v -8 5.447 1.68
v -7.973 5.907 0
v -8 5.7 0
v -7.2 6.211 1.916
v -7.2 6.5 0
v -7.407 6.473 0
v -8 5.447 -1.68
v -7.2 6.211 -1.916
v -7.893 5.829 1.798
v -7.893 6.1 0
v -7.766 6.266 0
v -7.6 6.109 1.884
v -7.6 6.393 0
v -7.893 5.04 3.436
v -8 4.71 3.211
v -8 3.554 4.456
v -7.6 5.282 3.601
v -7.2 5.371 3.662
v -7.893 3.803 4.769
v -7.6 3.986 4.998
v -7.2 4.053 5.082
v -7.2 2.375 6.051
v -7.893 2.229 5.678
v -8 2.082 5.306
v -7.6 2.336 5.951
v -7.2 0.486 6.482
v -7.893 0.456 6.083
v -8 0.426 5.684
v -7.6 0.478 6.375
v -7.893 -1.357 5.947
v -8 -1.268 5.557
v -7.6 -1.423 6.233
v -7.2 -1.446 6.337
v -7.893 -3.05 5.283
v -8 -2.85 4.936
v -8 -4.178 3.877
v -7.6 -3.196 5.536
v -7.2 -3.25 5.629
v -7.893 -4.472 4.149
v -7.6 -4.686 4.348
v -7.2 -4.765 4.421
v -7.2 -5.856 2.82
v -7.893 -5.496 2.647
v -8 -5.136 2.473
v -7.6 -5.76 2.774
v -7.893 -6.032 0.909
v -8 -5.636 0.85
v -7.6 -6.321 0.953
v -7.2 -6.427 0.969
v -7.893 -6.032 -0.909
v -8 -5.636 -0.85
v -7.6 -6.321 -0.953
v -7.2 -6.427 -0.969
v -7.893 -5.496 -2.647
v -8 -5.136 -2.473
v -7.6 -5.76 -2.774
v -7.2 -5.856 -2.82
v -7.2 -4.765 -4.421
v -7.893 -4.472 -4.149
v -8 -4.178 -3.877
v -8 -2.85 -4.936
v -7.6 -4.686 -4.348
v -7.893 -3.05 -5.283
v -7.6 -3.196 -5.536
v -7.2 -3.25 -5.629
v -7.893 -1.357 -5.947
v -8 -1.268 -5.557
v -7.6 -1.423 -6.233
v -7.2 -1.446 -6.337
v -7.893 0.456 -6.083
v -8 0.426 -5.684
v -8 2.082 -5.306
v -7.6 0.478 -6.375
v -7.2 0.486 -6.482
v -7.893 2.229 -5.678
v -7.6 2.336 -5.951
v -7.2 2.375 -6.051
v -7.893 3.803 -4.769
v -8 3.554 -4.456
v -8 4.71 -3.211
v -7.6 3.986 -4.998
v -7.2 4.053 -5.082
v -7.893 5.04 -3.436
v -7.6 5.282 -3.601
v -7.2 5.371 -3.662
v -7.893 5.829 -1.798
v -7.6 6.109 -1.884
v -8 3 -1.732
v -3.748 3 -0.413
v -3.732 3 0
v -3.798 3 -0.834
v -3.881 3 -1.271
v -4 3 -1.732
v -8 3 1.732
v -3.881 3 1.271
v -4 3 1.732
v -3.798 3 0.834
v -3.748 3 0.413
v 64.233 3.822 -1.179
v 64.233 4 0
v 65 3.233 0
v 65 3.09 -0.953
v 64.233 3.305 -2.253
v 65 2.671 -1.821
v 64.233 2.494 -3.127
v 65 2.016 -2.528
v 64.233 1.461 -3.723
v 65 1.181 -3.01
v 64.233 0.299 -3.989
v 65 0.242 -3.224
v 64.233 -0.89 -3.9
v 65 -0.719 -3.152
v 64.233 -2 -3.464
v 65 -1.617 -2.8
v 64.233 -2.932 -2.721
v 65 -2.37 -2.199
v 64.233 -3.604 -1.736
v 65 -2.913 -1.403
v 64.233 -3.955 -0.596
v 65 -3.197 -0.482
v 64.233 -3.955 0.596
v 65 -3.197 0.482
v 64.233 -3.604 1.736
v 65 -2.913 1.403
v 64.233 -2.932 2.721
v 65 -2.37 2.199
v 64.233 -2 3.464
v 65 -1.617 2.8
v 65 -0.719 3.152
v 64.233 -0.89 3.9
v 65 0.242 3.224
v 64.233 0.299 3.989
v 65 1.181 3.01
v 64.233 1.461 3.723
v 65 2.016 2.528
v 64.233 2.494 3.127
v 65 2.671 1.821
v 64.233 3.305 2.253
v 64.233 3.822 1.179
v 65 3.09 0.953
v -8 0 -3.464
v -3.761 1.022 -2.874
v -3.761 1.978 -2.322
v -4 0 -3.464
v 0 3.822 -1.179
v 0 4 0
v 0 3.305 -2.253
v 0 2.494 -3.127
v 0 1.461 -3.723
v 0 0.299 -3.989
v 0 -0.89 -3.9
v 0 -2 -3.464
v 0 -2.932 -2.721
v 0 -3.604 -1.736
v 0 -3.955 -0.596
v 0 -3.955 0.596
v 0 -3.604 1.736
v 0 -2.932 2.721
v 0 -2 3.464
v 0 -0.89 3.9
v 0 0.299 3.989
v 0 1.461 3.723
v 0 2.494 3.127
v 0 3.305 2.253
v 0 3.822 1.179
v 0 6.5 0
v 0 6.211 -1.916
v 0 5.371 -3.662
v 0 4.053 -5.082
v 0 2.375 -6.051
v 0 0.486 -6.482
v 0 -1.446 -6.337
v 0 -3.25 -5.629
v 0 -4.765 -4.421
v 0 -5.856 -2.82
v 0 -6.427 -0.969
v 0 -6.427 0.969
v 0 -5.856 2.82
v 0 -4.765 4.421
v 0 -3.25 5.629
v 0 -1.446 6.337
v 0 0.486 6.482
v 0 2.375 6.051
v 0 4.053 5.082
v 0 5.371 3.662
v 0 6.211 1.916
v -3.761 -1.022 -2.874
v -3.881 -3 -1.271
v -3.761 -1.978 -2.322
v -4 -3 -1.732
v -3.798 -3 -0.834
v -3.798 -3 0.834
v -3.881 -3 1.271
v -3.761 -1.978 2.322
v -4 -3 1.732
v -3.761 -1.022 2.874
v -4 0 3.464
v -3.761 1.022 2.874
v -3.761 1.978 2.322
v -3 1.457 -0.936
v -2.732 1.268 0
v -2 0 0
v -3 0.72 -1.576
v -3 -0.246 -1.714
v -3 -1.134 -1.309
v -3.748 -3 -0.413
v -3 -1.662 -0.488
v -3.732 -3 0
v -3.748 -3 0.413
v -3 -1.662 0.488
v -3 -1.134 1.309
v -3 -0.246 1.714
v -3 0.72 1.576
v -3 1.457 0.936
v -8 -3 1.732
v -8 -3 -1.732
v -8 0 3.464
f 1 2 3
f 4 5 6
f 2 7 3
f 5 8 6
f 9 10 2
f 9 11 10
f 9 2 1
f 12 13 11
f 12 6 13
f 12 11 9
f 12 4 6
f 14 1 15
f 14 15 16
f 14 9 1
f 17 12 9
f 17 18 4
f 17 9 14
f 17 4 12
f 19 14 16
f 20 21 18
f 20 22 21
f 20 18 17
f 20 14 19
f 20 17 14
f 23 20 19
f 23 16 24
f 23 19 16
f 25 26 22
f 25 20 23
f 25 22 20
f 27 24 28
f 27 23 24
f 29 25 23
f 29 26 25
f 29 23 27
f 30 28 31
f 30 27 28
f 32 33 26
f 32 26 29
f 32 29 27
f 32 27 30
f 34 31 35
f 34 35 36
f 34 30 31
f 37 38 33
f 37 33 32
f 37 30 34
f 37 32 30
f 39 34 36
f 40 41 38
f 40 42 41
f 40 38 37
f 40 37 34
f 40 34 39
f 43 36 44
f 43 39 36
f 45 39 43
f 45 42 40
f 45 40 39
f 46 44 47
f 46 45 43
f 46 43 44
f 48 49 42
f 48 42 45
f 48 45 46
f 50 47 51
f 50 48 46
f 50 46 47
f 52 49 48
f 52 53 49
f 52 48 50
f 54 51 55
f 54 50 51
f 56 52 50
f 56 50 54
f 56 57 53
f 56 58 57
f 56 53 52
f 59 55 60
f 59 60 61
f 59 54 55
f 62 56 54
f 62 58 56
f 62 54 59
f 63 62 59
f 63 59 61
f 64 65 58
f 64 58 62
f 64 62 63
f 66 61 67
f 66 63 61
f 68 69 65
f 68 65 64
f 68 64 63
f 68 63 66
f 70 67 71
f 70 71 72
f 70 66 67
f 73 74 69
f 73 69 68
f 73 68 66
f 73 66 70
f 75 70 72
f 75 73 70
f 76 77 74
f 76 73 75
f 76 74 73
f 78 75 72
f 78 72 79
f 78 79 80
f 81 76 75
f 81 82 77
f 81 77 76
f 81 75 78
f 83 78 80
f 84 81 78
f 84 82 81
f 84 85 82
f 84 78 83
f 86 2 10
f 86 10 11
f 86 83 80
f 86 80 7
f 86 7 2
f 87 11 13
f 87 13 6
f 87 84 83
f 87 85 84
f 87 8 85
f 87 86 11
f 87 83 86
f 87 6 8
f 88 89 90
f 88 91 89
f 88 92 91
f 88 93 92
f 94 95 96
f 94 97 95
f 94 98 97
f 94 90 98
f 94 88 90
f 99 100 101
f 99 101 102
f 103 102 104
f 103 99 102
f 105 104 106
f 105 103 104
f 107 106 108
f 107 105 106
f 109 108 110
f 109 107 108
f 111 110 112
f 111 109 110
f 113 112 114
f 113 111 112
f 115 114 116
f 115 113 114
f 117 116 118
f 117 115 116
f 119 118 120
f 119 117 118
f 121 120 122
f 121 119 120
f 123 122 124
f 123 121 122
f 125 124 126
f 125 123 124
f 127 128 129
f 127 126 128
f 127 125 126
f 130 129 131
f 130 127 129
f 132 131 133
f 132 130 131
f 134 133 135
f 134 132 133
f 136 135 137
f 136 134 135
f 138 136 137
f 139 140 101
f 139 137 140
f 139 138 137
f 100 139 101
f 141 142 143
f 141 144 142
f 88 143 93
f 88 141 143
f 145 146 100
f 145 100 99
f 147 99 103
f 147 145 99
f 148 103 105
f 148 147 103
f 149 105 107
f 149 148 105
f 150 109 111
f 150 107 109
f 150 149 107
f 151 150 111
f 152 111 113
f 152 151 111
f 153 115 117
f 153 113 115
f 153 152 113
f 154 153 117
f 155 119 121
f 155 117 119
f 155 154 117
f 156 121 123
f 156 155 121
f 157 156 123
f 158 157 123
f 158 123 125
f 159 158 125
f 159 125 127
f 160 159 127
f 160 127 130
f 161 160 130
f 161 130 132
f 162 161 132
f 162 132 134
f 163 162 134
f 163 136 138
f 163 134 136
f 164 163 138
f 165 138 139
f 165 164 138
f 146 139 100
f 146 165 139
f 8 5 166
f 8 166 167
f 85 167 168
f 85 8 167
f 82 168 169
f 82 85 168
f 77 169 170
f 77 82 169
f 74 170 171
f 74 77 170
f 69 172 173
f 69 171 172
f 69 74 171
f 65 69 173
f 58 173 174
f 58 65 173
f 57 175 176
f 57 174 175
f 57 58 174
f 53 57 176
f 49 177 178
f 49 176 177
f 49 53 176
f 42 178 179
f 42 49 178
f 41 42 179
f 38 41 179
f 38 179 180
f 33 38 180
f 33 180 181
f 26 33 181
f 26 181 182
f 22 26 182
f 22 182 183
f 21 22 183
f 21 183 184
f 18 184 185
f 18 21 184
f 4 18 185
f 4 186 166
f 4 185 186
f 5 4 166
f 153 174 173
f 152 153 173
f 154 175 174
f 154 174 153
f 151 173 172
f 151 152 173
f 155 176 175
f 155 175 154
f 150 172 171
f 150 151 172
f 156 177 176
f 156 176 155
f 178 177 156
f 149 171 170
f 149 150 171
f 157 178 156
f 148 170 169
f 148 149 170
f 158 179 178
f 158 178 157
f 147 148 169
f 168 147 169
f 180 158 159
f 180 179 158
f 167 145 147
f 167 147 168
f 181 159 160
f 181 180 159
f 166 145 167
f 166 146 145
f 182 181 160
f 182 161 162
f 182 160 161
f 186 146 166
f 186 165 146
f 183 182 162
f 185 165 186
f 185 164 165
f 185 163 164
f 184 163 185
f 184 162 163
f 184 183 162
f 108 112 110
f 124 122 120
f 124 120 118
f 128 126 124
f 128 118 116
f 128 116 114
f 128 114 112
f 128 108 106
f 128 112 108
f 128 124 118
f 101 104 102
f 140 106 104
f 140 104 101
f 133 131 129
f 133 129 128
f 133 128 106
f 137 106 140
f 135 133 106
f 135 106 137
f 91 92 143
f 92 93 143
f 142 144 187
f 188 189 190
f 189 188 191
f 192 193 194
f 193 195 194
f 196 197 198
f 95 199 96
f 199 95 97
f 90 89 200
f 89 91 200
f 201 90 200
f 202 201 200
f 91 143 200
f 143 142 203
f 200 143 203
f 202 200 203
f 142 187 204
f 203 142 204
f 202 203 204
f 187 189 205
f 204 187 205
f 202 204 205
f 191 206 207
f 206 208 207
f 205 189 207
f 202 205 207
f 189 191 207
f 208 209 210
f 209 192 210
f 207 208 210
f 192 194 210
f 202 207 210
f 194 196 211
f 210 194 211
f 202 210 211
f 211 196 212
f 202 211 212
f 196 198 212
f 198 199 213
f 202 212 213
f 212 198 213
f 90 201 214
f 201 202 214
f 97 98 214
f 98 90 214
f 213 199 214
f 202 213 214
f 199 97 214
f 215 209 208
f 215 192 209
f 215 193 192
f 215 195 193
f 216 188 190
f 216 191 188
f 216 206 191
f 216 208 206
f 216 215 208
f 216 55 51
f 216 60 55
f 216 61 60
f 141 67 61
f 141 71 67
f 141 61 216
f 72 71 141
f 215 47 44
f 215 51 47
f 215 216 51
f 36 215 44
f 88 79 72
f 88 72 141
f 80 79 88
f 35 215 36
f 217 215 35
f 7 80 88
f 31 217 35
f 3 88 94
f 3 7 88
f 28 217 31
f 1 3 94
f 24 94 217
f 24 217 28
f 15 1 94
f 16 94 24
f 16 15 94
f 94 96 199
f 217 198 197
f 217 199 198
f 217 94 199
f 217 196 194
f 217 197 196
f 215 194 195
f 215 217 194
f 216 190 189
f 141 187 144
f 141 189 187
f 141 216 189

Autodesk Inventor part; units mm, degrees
ref_plane "YZ Plane" through (0, 0, 0) normal (1, 0, 0) x (0, 1, 0)
ref_plane "XZ Plane" through (0, 0, 0) normal (0, 1, 0) x (-1, 0, 0)
sketch "Sketch1" plane through (0, 0, 0) normal (0, 0, 1) x (1, 0, 0)
  line L0 (-2, 0) -> (65, 0)
  line L1 (65, 0) -> (65, 4)
  line L2 (65, 4) -> (37, 4)
  line L3 (37, 4) -> (36.2331, 4)
  line L4 (36.2331, 4) -> (0, 4)
  line L5 (0, 4) -> (0, 6.5)
  line L6 (0, 6.5) -> (-8, 6.5)
  line L7 (-8, 6.5) -> (-8, 3.4641)
  line L8 (-8, 3.4641) -> (-4, 3.4641)
  line L9 (-4, 3.4641) -> (-2, 0)
  line L10 (-15.3, 0) -> (86.9, 0) projected
  line L11 (0, -0.65) -> (0, 8.45) projected
  line L12 (37, 4) -> (0, 4) construction
  dimension "d1" = 28
  dimension "d2" = 0.7669
  dimension "d3" = 8
  dimension "d4" = 4
  dimension "d5" = 60
  dimension "d6" = 8
  dimension "d7" = 8
  dimension "d8" = 6.9282
  dimension "d9" = 13
  dimension "d26" = 65
revolve "Body" add sketch "Sketch1" angle 360 about axis through (-2, 0, 0) along (1, 0, 0)
sketch "Sketch2" plane through (-8, 0, 0) normal (-1, 0, 0) x (0, 0, 1)
  circle A0 centre (0, 0) radius 3.4641 projected
  line L0 (0, -7.8) -> (0, 10.4) projected
  line L1 (-7.8, 0) -> (10.4, 0) projected
  line L2 (3.4641, 0) -> (1.7321, -3)
  line L3 (1.7321, -3) -> (-1.7321, -3)
  line L4 (-1.7321, -3) -> (-3.4641, 0)
  line L5 (-3.4641, 0) -> (-1.7321, 3)
  line L6 (-1.7321, 3) -> (1.7321, 3)
  line L7 (1.7321, 3) -> (3.4641, 0)
extrude "Slot" add sketch "Sketch2" against normal up to next contours L7 A0 | A0 L2 | L6 L0 A0 | A0 L0 L3 | L0 L6 A0 | A0 L3 L0 | L4 A0 | A0 L5
fillet "Fillet1" radius 0.8 1 edges at (-8, -6.5, 0)
thread "Thread" size "M8x1.25" class "6g" standard "ISO Metric profile" length 28
chamfer "Chamfer1" distance 0.7668 distance2 0.7668 1 edges at (65, -4, 0) measured on face at (65, -1.1806, -1.575)
ref_plane "Work Plane1" through (29, 0, 0) normal (0, -1, 0) x (1, 0, 0)
equation "\"d1\" = GEL"
equation "\"d3\" = KOH"
equation "\"d4\" = INTI"
equation "\"d6\" = GD"
equation "\"d7\" = BDM"
equation "\"d8\" = 1.1547 * SW"
equation "\"d9\" = KOD"
equation "\"d26\" = NLG"
equation "\"d17\" = RR"
equation "\"d13\" = GEL"
equation "\"d15\" = -0.5 * SPD + 0.5 * GD"
equation "\"d16\" = GUL"
equation "\"GD\" = 8"
equation "\"NLG\" = 65"
equation "\"GEL\" = 28"
equation "\"KOD\" = 13"
equation "\"KOH\" = 8"
equation "\"INTI\" = 4"
equation "\"GAL\" = 0.61345 * PTC"
equation "\"GUL\" = 0.61345 * PTC"
equation "\"BDM\" = NND"
equation "\"SW\" = 6"
equation "\"RR\" = 0.8"
equation "\"SPD\" = NND - 1.2269 * PTC"
equation "\"TOA\" = 30deg"
equation "\"GD1\" = THREADDIA - 1.2269 * PTC"
equation "\"THREADDIA\" = 8"
equation "\"FAWI\" = 45deg"
equation "\"PTC\" = 1.25"
equation "\"NND\" = 8"
equation "\"E0\" = 1.155 * SW"
properties part number "100021" material "Steel, Mild"
